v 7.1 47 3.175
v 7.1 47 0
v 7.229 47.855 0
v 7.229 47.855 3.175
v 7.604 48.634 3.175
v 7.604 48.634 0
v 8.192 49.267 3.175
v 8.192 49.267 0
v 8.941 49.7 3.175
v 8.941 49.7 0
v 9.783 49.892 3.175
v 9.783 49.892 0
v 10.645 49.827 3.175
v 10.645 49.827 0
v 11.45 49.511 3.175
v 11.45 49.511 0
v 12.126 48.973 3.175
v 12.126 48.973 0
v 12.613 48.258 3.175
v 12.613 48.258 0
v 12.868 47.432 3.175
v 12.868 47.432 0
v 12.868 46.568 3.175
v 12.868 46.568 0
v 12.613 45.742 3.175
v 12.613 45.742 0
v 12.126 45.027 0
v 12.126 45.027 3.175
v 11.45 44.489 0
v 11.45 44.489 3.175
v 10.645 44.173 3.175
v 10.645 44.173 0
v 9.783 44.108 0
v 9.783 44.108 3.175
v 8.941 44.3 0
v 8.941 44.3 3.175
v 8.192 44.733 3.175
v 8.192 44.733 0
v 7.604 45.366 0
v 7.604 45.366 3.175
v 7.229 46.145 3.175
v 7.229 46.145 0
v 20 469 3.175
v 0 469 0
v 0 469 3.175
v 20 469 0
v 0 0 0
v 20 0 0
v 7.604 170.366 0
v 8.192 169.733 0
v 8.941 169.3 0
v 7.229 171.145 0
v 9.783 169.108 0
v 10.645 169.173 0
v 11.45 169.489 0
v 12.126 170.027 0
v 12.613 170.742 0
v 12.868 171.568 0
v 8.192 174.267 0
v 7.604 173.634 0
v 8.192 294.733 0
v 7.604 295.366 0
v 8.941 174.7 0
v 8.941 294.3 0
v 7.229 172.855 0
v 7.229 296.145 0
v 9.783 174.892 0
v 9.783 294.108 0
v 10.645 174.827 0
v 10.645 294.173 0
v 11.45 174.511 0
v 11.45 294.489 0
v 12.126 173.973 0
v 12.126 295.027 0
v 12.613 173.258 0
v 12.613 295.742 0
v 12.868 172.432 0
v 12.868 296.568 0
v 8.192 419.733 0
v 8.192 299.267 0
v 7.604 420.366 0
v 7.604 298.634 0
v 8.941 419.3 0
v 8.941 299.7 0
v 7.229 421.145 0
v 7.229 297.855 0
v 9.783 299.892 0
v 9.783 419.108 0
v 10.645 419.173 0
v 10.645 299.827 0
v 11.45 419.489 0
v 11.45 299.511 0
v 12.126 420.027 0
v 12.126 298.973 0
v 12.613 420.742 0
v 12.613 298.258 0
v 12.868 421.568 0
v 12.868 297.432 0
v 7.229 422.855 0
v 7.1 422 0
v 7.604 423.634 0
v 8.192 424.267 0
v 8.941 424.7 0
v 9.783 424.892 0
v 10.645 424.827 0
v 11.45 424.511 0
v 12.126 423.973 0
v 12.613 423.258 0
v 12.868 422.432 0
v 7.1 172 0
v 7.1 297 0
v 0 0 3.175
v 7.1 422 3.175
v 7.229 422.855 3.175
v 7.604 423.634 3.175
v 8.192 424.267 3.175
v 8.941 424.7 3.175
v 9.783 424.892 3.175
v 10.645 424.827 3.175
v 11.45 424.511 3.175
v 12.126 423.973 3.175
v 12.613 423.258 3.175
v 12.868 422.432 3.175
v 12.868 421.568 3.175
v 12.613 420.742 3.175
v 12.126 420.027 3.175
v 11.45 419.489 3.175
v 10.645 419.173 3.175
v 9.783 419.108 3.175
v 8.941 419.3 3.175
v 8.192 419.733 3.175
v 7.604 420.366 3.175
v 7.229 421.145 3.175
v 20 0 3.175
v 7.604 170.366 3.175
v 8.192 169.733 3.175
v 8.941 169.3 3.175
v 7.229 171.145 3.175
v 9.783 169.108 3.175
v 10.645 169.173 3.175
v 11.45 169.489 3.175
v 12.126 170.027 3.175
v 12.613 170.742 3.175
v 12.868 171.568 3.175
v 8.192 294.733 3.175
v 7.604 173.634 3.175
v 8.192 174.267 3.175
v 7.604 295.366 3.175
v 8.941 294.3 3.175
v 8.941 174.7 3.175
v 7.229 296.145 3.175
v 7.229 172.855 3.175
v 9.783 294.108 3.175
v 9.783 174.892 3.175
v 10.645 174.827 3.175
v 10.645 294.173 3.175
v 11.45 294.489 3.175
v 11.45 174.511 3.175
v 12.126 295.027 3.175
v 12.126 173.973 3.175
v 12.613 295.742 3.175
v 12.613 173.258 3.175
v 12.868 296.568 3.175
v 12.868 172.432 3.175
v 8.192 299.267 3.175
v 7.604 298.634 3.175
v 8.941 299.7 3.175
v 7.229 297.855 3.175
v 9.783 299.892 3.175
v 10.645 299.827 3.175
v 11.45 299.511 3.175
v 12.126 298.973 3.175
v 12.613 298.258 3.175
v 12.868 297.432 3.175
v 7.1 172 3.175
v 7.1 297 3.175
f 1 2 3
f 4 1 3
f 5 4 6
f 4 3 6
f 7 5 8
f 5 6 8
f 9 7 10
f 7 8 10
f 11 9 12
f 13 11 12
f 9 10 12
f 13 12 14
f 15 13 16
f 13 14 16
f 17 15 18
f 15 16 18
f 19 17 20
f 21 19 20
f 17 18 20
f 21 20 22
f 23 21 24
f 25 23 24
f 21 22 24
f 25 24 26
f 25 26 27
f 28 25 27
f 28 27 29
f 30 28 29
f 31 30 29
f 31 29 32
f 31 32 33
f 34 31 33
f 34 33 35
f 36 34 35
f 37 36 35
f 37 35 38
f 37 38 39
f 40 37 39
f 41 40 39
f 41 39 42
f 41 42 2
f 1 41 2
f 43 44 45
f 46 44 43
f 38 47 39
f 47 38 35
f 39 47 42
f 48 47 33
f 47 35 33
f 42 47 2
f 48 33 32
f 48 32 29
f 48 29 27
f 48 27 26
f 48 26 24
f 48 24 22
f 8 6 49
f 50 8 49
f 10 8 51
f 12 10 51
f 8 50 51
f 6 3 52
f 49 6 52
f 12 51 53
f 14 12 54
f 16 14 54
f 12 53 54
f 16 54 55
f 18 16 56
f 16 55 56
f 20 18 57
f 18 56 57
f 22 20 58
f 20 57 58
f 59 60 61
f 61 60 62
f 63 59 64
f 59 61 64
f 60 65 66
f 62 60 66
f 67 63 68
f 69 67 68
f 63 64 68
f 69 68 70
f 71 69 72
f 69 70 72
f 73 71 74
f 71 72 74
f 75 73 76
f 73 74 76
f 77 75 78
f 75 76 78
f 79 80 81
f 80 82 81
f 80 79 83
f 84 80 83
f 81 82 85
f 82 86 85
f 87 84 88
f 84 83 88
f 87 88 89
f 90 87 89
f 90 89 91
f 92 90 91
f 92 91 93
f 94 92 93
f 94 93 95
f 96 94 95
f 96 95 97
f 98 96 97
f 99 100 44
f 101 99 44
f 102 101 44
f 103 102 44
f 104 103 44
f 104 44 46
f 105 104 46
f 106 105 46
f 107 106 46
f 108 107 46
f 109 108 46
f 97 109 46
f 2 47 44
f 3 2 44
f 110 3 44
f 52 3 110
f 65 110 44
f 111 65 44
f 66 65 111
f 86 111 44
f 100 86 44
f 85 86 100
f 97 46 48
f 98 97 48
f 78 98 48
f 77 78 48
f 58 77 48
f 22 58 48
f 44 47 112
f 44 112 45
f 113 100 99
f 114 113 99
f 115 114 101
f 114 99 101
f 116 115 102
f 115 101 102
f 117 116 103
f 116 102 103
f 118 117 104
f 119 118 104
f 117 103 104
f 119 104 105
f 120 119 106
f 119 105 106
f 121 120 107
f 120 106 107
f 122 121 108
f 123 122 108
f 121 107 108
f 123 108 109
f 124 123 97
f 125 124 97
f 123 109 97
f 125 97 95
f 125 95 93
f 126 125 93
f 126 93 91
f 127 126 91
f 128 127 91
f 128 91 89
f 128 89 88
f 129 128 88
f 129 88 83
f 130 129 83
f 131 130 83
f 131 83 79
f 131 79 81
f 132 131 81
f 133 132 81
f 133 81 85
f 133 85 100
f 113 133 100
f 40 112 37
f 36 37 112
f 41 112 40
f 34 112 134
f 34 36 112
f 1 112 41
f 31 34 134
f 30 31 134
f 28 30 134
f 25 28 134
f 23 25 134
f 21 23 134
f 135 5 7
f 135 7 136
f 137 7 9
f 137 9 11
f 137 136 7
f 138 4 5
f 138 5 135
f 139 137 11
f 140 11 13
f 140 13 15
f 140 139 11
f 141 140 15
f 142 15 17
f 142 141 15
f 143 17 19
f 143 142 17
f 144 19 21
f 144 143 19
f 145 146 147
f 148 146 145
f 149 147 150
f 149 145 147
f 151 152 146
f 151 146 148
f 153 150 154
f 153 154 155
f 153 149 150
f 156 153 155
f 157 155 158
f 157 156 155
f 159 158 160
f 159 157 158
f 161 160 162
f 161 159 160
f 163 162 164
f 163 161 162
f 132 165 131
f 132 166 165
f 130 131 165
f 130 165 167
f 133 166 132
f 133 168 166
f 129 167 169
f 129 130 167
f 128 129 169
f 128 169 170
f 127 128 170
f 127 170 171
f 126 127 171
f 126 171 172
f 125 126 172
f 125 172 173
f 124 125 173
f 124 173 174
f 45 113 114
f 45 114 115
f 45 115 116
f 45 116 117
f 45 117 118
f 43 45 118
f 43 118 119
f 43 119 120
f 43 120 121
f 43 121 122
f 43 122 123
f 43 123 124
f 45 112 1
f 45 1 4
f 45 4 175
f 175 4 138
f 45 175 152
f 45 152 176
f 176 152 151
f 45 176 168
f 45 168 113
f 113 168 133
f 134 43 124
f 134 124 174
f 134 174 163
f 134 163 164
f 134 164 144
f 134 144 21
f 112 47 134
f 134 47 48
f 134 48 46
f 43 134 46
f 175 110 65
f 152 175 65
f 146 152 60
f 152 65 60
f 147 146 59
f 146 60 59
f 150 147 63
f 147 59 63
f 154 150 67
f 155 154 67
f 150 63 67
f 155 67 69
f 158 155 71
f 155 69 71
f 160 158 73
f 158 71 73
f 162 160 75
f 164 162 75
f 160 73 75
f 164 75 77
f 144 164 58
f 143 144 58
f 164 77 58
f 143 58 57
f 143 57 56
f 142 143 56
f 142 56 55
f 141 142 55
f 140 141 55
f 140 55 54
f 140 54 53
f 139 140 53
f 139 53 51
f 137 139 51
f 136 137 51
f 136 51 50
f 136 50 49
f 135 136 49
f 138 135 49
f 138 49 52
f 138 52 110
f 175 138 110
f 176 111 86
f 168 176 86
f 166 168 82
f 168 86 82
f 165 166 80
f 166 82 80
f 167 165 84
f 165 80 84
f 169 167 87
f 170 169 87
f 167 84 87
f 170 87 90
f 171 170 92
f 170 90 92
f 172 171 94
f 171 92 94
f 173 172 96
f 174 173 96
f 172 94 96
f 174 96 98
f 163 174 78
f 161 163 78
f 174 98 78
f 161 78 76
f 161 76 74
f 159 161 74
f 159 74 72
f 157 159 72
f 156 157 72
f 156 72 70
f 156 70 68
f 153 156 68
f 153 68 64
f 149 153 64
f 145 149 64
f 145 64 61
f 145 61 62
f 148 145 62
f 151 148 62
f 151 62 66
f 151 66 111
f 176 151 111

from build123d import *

# Parameters (mm, degrees)
SKETCH2_W            = 20
SKETCH2_H            = 469
BOSS_EXTRUDE1_DEPTH  = 3.175
M5_CLEARANCE_HOLE1_D = 5.8
LPATTERN1_COUNT      = 4
LPATTERN1_PITCH      = 125


with BuildPart() as part:
    # Sketch2 → Boss-Extrude1 (new body)
    with BuildSketch(Plane.XY):
        with Locations((10, 234.5)):
            Rectangle(SKETCH2_W, SKETCH2_H)
    extrude(amount=BOSS_EXTRUDE1_DEPTH)

    # M5 Clearance Hole1 (through all)
    with Locations(Plane(origin=(10, 47, 3.175), x_dir=(1, 0, 0), z_dir=(0, 0, 1))):
        with Locations((0, 0)):
            m5_clearance_hole1 = Hole(M5_CLEARANCE_HOLE1_D / 2)

    # LPattern1: M5 Clearance Hole1 ×4
    with Locations(*[(0, i * LPATTERN1_PITCH, 0) for i in range(1, LPATTERN1_COUNT)]):
        add(m5_clearance_hole1, mode=Mode.SUBTRACT)


solid = part.part
